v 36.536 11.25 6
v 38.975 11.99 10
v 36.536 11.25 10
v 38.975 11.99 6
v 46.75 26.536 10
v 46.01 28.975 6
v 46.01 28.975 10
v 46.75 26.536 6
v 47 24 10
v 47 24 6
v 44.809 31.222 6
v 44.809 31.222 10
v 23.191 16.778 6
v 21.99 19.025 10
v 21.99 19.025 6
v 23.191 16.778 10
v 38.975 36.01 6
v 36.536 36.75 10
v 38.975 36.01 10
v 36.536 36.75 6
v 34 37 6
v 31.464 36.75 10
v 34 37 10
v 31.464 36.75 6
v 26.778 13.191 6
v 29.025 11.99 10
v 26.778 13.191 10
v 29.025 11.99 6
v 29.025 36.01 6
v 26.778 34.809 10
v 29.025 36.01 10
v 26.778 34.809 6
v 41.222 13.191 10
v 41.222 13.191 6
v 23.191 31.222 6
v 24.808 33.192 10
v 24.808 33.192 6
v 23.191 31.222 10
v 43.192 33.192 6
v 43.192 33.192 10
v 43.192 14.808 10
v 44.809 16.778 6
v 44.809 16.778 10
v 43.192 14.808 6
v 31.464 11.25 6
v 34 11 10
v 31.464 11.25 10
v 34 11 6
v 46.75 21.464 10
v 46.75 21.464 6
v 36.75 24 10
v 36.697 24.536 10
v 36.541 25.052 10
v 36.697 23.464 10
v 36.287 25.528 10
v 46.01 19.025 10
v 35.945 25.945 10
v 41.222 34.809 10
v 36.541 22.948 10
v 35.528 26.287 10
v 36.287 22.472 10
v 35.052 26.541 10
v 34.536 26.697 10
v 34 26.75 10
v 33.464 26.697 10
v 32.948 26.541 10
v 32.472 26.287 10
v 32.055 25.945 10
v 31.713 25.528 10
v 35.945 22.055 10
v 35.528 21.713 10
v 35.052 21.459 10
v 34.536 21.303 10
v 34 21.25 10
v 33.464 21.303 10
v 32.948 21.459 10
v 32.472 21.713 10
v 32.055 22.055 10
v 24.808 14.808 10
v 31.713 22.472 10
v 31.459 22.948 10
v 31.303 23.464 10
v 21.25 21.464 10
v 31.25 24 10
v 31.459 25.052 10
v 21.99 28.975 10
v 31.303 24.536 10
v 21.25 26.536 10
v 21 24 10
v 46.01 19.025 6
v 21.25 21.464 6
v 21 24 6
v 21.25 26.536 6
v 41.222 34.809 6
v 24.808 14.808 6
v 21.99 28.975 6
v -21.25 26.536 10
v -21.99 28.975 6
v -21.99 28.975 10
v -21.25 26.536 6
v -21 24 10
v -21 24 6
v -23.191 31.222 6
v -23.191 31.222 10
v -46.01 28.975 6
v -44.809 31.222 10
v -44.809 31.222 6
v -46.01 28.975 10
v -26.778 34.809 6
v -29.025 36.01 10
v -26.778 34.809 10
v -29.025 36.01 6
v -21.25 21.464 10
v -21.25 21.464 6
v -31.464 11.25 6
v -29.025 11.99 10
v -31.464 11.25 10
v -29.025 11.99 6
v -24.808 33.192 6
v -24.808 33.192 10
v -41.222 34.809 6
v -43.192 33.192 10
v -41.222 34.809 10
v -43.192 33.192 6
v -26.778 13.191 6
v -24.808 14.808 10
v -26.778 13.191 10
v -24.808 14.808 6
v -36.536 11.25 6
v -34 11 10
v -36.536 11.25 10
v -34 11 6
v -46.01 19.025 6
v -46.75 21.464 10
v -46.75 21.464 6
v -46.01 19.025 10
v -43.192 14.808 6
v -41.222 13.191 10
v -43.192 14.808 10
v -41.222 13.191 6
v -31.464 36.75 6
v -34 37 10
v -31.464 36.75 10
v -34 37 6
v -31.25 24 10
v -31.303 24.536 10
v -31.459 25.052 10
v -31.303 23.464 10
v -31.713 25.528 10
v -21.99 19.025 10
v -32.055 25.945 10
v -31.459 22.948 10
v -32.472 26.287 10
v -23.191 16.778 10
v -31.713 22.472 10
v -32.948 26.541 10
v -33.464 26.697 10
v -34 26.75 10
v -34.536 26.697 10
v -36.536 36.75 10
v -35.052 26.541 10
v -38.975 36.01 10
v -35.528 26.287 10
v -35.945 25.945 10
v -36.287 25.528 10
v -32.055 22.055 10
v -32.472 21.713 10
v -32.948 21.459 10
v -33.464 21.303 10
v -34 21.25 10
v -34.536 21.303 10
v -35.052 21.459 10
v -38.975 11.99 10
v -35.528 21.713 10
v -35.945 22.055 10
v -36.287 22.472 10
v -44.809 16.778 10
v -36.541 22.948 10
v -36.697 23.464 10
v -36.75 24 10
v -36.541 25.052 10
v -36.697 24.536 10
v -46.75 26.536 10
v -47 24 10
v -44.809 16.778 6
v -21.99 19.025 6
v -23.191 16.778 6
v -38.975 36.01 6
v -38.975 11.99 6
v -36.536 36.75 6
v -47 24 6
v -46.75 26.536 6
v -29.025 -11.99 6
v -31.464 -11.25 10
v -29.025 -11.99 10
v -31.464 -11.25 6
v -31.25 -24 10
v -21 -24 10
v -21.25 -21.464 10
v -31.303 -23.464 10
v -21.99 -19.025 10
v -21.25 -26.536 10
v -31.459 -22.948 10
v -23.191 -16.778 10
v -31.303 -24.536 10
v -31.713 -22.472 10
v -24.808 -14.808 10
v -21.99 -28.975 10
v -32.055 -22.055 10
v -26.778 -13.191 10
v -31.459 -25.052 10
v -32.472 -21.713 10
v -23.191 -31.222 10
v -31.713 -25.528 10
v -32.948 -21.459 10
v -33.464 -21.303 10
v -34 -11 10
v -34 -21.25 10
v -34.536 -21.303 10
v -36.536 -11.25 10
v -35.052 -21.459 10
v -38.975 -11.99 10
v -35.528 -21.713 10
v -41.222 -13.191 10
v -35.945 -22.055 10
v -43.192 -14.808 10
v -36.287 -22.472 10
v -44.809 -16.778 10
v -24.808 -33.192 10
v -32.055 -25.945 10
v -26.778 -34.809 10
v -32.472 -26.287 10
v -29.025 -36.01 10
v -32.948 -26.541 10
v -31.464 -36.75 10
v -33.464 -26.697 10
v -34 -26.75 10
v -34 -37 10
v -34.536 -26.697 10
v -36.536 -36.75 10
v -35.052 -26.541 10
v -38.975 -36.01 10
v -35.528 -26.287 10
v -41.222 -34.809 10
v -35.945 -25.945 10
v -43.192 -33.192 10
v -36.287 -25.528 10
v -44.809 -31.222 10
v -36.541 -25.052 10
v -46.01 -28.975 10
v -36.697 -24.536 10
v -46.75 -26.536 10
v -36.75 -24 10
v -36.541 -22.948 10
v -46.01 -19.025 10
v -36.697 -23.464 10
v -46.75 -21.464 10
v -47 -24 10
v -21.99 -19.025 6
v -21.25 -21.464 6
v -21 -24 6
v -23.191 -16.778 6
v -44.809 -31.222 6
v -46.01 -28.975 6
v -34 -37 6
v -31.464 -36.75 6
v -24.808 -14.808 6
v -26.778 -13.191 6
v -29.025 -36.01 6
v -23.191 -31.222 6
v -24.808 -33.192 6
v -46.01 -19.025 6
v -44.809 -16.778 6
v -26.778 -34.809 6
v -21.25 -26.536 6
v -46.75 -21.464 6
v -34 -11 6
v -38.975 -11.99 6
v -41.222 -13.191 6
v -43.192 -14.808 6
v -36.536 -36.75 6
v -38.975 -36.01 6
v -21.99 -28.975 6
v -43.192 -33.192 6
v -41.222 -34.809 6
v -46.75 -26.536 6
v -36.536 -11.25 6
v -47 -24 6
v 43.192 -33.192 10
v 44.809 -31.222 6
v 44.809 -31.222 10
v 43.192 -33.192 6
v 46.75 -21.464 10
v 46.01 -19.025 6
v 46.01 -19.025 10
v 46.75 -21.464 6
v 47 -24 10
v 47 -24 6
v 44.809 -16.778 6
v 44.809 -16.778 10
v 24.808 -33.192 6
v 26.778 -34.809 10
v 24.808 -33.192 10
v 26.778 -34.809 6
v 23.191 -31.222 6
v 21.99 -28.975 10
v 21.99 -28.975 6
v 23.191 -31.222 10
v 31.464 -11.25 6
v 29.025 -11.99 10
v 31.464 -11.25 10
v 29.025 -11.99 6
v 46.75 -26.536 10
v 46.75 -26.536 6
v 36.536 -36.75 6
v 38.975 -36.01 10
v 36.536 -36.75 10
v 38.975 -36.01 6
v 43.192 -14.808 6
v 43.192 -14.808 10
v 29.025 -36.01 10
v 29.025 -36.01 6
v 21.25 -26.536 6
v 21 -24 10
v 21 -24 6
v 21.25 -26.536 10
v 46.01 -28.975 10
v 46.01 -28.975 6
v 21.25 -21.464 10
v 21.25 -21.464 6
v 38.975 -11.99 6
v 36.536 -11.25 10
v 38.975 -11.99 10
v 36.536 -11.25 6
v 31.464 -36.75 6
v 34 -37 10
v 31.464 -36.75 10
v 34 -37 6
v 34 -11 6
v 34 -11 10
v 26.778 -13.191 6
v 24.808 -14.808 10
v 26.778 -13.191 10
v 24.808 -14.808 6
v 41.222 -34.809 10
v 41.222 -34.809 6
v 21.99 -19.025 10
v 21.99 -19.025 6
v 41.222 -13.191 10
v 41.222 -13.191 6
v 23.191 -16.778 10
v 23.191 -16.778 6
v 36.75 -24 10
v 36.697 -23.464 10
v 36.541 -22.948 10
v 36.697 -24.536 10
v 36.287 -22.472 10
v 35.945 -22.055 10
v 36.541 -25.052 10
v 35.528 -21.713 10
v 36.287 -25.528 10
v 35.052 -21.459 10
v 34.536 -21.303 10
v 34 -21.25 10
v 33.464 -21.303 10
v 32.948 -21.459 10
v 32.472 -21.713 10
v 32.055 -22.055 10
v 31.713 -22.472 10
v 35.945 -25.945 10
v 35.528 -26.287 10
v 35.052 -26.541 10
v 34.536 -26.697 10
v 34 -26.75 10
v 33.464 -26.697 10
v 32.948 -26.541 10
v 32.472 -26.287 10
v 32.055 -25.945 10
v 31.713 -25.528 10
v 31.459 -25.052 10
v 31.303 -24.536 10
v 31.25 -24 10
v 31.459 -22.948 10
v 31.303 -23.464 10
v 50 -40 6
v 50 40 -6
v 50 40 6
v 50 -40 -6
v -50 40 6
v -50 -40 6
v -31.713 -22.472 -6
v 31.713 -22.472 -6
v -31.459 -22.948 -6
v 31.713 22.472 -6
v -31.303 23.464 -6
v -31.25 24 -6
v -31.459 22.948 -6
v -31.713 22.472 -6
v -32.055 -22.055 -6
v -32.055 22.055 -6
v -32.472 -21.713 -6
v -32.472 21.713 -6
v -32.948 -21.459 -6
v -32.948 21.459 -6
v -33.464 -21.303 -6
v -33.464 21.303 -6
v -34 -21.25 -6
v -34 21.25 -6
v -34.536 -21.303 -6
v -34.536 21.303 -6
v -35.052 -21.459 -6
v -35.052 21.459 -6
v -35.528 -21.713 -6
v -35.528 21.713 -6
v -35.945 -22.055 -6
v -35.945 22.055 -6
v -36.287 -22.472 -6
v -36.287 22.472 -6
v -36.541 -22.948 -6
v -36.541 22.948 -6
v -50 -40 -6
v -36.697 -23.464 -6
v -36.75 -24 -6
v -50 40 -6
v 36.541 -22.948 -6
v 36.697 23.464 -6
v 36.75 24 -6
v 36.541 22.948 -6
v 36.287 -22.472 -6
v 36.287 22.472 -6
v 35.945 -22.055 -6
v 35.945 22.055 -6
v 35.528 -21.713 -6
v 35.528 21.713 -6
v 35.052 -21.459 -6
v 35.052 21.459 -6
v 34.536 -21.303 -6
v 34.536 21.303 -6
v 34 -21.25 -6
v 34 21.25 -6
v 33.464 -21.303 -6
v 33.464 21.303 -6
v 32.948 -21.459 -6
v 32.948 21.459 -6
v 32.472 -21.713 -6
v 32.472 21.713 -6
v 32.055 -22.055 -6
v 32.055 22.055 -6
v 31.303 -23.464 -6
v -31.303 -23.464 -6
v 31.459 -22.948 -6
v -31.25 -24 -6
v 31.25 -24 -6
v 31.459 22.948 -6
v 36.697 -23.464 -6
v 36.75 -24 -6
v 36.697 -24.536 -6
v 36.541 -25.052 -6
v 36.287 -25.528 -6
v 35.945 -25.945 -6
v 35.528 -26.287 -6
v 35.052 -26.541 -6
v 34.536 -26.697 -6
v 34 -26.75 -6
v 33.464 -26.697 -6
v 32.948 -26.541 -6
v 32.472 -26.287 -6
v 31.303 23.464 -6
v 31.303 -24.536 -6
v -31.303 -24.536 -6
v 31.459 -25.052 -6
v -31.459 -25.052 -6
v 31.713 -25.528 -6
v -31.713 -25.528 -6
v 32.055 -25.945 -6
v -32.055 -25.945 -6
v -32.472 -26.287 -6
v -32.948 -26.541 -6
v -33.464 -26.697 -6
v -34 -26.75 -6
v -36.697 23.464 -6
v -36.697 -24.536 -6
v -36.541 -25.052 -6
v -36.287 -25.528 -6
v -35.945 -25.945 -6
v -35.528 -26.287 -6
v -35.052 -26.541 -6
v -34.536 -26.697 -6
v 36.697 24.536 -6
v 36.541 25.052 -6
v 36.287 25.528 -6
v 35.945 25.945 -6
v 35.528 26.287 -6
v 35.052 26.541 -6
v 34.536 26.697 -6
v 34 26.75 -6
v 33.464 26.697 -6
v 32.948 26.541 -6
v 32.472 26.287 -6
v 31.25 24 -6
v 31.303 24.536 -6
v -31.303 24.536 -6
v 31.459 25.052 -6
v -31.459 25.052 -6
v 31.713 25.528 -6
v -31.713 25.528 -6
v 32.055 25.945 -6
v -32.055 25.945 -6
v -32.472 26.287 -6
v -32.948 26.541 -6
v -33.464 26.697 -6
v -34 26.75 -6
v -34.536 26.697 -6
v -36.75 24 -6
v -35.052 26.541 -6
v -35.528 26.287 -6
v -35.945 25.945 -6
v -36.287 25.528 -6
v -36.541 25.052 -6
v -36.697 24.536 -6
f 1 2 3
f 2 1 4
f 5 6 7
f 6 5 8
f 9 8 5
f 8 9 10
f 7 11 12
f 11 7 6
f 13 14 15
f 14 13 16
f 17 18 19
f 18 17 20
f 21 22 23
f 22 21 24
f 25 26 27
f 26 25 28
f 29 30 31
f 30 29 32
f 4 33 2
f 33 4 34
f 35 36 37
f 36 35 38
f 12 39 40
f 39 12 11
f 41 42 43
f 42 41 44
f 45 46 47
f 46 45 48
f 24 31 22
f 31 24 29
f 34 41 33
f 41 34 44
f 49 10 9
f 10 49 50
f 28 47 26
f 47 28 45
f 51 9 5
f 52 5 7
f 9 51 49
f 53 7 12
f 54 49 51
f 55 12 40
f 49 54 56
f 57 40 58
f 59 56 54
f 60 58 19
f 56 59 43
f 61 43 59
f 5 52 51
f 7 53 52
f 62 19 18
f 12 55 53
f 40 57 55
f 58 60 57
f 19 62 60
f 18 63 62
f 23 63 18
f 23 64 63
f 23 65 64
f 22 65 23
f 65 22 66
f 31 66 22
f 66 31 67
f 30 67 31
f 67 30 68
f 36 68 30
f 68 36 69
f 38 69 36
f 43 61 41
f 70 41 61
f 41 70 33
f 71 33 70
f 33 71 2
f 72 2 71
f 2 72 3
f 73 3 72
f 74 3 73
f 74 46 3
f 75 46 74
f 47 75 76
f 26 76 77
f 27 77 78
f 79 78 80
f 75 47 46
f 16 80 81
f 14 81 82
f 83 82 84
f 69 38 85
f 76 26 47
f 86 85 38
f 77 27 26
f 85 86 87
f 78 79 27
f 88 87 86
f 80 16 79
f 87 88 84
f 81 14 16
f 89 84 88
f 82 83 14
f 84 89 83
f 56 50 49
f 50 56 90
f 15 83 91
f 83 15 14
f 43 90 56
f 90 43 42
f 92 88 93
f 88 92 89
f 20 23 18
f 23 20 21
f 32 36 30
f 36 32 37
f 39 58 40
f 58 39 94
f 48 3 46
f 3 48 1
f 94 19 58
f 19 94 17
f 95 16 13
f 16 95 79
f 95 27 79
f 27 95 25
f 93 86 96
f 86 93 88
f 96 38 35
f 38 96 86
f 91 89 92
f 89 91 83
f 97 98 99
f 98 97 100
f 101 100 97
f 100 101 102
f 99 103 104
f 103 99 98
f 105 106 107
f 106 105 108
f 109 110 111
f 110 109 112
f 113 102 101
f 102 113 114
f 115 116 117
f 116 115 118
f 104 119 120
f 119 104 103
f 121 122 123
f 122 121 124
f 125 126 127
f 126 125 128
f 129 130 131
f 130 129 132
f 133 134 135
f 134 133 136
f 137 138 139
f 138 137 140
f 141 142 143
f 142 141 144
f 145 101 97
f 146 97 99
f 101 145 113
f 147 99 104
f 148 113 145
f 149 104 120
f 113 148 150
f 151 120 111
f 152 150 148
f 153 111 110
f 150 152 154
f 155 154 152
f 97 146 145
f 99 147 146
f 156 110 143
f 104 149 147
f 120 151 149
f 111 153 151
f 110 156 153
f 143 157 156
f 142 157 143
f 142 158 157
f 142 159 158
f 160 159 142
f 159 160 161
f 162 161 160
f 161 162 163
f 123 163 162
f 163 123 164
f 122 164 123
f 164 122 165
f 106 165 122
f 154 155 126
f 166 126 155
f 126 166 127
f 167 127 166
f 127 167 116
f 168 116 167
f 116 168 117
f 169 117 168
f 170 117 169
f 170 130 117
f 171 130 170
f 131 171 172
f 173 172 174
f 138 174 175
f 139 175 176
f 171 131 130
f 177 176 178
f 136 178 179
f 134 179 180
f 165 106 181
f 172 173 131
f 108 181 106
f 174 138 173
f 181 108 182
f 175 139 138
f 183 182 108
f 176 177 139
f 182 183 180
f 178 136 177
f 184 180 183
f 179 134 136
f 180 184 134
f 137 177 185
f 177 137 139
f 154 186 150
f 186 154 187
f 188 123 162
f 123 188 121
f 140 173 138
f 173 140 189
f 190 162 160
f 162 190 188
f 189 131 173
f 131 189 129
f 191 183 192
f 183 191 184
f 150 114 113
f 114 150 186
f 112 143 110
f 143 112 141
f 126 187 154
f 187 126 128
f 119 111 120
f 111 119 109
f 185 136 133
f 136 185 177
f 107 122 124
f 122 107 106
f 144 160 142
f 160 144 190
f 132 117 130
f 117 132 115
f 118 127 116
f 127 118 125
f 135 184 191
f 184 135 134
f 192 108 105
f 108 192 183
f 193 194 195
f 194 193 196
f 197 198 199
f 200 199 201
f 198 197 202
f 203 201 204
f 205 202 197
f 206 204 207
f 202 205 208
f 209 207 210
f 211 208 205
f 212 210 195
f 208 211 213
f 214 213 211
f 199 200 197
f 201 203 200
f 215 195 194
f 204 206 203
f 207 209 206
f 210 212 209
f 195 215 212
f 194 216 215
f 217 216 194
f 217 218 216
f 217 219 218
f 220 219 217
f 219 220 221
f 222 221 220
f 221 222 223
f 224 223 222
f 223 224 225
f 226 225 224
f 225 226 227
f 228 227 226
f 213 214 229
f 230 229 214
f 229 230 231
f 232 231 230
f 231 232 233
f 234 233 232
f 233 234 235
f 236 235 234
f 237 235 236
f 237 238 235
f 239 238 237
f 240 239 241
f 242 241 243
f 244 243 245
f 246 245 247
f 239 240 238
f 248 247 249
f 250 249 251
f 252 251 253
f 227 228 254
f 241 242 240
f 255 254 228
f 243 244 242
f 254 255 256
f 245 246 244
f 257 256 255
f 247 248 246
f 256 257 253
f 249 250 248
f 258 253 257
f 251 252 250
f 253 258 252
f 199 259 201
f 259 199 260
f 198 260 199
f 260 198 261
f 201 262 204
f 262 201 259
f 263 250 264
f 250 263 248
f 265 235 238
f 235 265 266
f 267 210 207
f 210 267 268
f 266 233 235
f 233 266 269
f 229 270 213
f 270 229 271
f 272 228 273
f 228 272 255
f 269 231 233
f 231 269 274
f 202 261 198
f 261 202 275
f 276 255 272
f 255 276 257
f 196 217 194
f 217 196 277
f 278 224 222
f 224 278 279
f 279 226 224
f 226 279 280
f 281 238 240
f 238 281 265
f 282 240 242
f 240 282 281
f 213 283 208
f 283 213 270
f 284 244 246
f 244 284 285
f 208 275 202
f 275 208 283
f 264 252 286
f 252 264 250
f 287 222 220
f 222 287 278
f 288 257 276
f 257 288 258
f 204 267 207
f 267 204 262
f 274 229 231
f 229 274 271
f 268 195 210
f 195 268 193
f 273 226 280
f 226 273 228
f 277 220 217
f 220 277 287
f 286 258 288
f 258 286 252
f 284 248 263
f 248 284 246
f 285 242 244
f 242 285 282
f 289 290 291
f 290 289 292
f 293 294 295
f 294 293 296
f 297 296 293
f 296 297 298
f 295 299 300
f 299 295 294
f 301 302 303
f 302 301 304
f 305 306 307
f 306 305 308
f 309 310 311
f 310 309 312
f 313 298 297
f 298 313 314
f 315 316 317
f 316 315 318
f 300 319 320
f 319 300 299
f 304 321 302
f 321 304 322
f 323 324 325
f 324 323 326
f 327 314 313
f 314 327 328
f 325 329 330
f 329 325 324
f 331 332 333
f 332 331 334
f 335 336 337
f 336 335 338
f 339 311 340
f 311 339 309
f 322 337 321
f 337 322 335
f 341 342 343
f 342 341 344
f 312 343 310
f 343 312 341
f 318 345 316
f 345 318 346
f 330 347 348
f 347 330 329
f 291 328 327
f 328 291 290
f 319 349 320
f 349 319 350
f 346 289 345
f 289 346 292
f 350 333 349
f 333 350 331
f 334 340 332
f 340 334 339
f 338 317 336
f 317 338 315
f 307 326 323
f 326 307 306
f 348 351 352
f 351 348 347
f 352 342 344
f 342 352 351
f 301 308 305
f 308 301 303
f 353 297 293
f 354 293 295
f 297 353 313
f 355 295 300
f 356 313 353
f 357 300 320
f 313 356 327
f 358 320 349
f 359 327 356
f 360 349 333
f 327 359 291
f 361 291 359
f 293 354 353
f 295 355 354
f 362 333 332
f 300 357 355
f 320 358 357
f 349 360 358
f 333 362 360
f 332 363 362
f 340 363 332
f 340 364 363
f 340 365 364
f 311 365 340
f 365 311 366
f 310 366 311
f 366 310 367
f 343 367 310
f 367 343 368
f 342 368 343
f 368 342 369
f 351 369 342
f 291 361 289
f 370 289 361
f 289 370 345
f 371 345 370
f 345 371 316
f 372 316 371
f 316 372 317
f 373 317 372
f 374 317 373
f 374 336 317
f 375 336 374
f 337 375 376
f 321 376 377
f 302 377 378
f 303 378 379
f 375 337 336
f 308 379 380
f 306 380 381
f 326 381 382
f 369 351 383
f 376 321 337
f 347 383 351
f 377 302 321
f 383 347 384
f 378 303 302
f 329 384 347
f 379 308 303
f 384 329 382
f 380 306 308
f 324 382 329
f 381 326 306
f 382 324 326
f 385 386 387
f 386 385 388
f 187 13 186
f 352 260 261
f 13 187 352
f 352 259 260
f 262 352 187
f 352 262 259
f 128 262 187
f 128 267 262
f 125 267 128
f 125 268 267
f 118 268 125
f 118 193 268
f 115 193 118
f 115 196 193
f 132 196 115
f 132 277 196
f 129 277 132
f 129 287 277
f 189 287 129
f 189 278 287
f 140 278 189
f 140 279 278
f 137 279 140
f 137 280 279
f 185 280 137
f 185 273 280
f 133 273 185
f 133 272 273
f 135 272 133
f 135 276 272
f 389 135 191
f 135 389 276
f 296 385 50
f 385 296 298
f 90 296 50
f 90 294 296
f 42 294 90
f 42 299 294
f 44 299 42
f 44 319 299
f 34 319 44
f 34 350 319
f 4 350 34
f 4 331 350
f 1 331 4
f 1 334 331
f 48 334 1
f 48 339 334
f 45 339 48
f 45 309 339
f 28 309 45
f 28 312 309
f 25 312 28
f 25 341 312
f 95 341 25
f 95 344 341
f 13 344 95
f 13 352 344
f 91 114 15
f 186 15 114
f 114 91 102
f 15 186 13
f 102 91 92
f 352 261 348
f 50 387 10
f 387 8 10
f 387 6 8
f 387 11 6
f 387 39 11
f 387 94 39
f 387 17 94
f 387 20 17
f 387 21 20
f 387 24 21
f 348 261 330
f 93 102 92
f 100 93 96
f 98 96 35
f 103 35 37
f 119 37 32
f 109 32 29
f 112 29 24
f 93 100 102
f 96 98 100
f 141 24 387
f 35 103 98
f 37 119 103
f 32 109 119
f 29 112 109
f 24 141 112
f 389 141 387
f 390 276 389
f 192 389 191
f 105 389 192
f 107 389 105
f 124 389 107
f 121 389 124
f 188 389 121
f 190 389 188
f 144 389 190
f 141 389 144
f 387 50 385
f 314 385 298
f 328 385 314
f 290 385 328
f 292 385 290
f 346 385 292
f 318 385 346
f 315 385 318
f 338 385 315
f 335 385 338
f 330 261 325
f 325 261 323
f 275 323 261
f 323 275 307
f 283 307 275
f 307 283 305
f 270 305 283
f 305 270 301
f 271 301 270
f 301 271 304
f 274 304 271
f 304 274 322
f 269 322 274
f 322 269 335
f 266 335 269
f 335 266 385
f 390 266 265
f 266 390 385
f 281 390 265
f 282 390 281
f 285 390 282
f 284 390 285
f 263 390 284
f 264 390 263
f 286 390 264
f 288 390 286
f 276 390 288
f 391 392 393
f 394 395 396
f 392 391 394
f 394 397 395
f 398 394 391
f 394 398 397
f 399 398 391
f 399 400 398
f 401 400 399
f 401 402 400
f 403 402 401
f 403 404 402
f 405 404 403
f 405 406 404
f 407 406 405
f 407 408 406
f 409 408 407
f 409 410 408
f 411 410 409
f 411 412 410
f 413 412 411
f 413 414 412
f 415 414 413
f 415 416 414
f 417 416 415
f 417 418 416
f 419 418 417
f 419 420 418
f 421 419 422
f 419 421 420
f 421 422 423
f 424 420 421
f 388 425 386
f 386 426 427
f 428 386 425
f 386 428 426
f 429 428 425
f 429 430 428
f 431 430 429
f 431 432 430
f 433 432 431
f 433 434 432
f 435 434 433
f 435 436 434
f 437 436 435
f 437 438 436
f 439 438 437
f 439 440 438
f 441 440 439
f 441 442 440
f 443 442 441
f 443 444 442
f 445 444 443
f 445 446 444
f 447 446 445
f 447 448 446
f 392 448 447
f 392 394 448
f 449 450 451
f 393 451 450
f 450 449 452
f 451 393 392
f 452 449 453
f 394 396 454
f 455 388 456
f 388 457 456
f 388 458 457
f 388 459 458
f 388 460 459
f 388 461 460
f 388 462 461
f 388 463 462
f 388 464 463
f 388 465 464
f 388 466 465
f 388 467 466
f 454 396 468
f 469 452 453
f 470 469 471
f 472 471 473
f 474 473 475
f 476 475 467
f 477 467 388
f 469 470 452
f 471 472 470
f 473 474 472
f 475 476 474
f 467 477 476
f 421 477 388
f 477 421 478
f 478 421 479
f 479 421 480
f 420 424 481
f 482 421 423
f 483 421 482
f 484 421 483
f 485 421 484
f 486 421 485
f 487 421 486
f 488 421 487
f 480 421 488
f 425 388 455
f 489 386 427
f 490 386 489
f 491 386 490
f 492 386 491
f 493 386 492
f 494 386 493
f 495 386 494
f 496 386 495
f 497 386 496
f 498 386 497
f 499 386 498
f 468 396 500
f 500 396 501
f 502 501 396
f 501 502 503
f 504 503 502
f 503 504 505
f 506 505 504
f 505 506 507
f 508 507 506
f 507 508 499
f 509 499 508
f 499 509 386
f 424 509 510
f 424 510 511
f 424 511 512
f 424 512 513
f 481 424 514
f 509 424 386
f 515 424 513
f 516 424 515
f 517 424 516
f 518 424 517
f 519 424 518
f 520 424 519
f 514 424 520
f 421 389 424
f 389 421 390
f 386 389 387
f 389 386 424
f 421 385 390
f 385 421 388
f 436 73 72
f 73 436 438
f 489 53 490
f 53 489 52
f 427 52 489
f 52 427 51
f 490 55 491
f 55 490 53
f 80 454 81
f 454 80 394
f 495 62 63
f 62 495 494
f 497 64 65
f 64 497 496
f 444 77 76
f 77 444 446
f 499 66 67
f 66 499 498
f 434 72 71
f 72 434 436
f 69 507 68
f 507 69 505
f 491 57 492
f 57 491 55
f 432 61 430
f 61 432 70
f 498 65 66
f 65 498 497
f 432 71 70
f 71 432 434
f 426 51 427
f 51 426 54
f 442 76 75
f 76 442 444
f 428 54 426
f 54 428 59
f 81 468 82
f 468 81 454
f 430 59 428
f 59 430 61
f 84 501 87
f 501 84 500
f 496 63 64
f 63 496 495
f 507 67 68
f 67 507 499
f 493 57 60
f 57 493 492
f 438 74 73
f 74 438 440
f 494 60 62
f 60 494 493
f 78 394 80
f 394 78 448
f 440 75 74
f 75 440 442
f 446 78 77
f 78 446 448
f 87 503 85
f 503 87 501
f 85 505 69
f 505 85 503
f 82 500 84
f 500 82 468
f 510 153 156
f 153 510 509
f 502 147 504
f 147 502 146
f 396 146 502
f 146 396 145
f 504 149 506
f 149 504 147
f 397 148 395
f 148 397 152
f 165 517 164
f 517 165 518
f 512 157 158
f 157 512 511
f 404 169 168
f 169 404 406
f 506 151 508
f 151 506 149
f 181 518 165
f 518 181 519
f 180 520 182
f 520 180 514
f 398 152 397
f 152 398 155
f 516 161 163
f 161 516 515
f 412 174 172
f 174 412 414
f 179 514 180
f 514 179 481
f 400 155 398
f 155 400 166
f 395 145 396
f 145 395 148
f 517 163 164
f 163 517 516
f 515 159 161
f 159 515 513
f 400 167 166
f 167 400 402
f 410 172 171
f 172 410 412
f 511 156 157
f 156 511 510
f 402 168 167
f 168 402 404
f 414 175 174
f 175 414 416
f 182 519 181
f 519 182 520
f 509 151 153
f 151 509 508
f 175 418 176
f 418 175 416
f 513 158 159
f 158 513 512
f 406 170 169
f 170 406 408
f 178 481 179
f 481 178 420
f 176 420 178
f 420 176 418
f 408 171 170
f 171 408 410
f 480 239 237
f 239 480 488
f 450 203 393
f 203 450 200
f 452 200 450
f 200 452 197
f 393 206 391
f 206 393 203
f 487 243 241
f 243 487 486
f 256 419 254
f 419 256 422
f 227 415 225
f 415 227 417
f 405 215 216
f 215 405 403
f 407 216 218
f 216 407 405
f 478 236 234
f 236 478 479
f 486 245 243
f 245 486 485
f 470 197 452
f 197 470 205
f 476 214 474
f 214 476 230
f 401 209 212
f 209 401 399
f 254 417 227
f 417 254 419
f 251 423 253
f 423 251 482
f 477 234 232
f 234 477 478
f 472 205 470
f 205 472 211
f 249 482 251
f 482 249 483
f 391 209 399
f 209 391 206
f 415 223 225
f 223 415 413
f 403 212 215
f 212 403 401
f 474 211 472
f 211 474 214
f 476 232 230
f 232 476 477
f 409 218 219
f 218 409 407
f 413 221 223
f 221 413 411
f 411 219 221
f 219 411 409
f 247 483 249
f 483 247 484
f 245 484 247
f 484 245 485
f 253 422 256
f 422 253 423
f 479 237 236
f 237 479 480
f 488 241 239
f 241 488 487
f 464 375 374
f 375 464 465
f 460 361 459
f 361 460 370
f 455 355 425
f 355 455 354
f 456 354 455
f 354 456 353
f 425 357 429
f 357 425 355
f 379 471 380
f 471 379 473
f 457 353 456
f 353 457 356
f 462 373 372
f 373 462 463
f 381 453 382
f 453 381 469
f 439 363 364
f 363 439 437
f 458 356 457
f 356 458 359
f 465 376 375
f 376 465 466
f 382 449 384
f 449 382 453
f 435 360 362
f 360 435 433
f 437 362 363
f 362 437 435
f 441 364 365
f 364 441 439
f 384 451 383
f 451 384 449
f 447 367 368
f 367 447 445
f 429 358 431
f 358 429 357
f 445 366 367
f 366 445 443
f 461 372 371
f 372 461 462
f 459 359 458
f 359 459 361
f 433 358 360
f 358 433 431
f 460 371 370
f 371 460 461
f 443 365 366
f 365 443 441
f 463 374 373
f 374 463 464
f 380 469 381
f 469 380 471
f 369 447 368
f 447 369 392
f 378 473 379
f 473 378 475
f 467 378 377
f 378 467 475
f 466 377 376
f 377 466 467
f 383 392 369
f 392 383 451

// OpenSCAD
$fn = 32;

// ----------------------------------------------------------------------
// Anchor pads 100 x 80 x 16
// four corner bosses with anchor holes
// ----------------------------------------------------------------------

// --- parameters (mm) ---
plate = [100, 80, 12];  // base plate size (x, y, z)
pads = 4;               // boss count, one per corner
edge = 16;              // boss centre offset from the plate edge
boss_d = 26;            // boss diameter
boss_h = 4;             // boss height above the base plate
hole_d = 5.5;           // hole diameter

// --- derived feature positions (mm) ---
height = plate[2] + boss_h;      // = 16   overall height of the part
corner_x = plate[0] / 2 - edge;  // = 34   boss centre X
corner_y = plate[1] / 2 - edge;  // = 24   boss centre Y
feature_centers = [
  [corner_x, corner_y],
  [-corner_x, corner_y],
  [-corner_x, -corner_y],
  [corner_x, -corner_y]
];   // boss centres, anchor holes are drilled there

// base plate, four bosses standing on it, anchor holes all the way through
difference() {
  union() {
    cube(plate, center = true);
    for (centre = feature_centers)
      translate([centre[0], centre[1], plate[2] / 2 - 1])
        cylinder(d = boss_d, h = boss_h + 1);
  }
  for (centre = feature_centers)
    translate([centre[0], centre[1], -height])
      cylinder(d = hole_d, h = 2 * height + 2);  // through boss and plate
}
